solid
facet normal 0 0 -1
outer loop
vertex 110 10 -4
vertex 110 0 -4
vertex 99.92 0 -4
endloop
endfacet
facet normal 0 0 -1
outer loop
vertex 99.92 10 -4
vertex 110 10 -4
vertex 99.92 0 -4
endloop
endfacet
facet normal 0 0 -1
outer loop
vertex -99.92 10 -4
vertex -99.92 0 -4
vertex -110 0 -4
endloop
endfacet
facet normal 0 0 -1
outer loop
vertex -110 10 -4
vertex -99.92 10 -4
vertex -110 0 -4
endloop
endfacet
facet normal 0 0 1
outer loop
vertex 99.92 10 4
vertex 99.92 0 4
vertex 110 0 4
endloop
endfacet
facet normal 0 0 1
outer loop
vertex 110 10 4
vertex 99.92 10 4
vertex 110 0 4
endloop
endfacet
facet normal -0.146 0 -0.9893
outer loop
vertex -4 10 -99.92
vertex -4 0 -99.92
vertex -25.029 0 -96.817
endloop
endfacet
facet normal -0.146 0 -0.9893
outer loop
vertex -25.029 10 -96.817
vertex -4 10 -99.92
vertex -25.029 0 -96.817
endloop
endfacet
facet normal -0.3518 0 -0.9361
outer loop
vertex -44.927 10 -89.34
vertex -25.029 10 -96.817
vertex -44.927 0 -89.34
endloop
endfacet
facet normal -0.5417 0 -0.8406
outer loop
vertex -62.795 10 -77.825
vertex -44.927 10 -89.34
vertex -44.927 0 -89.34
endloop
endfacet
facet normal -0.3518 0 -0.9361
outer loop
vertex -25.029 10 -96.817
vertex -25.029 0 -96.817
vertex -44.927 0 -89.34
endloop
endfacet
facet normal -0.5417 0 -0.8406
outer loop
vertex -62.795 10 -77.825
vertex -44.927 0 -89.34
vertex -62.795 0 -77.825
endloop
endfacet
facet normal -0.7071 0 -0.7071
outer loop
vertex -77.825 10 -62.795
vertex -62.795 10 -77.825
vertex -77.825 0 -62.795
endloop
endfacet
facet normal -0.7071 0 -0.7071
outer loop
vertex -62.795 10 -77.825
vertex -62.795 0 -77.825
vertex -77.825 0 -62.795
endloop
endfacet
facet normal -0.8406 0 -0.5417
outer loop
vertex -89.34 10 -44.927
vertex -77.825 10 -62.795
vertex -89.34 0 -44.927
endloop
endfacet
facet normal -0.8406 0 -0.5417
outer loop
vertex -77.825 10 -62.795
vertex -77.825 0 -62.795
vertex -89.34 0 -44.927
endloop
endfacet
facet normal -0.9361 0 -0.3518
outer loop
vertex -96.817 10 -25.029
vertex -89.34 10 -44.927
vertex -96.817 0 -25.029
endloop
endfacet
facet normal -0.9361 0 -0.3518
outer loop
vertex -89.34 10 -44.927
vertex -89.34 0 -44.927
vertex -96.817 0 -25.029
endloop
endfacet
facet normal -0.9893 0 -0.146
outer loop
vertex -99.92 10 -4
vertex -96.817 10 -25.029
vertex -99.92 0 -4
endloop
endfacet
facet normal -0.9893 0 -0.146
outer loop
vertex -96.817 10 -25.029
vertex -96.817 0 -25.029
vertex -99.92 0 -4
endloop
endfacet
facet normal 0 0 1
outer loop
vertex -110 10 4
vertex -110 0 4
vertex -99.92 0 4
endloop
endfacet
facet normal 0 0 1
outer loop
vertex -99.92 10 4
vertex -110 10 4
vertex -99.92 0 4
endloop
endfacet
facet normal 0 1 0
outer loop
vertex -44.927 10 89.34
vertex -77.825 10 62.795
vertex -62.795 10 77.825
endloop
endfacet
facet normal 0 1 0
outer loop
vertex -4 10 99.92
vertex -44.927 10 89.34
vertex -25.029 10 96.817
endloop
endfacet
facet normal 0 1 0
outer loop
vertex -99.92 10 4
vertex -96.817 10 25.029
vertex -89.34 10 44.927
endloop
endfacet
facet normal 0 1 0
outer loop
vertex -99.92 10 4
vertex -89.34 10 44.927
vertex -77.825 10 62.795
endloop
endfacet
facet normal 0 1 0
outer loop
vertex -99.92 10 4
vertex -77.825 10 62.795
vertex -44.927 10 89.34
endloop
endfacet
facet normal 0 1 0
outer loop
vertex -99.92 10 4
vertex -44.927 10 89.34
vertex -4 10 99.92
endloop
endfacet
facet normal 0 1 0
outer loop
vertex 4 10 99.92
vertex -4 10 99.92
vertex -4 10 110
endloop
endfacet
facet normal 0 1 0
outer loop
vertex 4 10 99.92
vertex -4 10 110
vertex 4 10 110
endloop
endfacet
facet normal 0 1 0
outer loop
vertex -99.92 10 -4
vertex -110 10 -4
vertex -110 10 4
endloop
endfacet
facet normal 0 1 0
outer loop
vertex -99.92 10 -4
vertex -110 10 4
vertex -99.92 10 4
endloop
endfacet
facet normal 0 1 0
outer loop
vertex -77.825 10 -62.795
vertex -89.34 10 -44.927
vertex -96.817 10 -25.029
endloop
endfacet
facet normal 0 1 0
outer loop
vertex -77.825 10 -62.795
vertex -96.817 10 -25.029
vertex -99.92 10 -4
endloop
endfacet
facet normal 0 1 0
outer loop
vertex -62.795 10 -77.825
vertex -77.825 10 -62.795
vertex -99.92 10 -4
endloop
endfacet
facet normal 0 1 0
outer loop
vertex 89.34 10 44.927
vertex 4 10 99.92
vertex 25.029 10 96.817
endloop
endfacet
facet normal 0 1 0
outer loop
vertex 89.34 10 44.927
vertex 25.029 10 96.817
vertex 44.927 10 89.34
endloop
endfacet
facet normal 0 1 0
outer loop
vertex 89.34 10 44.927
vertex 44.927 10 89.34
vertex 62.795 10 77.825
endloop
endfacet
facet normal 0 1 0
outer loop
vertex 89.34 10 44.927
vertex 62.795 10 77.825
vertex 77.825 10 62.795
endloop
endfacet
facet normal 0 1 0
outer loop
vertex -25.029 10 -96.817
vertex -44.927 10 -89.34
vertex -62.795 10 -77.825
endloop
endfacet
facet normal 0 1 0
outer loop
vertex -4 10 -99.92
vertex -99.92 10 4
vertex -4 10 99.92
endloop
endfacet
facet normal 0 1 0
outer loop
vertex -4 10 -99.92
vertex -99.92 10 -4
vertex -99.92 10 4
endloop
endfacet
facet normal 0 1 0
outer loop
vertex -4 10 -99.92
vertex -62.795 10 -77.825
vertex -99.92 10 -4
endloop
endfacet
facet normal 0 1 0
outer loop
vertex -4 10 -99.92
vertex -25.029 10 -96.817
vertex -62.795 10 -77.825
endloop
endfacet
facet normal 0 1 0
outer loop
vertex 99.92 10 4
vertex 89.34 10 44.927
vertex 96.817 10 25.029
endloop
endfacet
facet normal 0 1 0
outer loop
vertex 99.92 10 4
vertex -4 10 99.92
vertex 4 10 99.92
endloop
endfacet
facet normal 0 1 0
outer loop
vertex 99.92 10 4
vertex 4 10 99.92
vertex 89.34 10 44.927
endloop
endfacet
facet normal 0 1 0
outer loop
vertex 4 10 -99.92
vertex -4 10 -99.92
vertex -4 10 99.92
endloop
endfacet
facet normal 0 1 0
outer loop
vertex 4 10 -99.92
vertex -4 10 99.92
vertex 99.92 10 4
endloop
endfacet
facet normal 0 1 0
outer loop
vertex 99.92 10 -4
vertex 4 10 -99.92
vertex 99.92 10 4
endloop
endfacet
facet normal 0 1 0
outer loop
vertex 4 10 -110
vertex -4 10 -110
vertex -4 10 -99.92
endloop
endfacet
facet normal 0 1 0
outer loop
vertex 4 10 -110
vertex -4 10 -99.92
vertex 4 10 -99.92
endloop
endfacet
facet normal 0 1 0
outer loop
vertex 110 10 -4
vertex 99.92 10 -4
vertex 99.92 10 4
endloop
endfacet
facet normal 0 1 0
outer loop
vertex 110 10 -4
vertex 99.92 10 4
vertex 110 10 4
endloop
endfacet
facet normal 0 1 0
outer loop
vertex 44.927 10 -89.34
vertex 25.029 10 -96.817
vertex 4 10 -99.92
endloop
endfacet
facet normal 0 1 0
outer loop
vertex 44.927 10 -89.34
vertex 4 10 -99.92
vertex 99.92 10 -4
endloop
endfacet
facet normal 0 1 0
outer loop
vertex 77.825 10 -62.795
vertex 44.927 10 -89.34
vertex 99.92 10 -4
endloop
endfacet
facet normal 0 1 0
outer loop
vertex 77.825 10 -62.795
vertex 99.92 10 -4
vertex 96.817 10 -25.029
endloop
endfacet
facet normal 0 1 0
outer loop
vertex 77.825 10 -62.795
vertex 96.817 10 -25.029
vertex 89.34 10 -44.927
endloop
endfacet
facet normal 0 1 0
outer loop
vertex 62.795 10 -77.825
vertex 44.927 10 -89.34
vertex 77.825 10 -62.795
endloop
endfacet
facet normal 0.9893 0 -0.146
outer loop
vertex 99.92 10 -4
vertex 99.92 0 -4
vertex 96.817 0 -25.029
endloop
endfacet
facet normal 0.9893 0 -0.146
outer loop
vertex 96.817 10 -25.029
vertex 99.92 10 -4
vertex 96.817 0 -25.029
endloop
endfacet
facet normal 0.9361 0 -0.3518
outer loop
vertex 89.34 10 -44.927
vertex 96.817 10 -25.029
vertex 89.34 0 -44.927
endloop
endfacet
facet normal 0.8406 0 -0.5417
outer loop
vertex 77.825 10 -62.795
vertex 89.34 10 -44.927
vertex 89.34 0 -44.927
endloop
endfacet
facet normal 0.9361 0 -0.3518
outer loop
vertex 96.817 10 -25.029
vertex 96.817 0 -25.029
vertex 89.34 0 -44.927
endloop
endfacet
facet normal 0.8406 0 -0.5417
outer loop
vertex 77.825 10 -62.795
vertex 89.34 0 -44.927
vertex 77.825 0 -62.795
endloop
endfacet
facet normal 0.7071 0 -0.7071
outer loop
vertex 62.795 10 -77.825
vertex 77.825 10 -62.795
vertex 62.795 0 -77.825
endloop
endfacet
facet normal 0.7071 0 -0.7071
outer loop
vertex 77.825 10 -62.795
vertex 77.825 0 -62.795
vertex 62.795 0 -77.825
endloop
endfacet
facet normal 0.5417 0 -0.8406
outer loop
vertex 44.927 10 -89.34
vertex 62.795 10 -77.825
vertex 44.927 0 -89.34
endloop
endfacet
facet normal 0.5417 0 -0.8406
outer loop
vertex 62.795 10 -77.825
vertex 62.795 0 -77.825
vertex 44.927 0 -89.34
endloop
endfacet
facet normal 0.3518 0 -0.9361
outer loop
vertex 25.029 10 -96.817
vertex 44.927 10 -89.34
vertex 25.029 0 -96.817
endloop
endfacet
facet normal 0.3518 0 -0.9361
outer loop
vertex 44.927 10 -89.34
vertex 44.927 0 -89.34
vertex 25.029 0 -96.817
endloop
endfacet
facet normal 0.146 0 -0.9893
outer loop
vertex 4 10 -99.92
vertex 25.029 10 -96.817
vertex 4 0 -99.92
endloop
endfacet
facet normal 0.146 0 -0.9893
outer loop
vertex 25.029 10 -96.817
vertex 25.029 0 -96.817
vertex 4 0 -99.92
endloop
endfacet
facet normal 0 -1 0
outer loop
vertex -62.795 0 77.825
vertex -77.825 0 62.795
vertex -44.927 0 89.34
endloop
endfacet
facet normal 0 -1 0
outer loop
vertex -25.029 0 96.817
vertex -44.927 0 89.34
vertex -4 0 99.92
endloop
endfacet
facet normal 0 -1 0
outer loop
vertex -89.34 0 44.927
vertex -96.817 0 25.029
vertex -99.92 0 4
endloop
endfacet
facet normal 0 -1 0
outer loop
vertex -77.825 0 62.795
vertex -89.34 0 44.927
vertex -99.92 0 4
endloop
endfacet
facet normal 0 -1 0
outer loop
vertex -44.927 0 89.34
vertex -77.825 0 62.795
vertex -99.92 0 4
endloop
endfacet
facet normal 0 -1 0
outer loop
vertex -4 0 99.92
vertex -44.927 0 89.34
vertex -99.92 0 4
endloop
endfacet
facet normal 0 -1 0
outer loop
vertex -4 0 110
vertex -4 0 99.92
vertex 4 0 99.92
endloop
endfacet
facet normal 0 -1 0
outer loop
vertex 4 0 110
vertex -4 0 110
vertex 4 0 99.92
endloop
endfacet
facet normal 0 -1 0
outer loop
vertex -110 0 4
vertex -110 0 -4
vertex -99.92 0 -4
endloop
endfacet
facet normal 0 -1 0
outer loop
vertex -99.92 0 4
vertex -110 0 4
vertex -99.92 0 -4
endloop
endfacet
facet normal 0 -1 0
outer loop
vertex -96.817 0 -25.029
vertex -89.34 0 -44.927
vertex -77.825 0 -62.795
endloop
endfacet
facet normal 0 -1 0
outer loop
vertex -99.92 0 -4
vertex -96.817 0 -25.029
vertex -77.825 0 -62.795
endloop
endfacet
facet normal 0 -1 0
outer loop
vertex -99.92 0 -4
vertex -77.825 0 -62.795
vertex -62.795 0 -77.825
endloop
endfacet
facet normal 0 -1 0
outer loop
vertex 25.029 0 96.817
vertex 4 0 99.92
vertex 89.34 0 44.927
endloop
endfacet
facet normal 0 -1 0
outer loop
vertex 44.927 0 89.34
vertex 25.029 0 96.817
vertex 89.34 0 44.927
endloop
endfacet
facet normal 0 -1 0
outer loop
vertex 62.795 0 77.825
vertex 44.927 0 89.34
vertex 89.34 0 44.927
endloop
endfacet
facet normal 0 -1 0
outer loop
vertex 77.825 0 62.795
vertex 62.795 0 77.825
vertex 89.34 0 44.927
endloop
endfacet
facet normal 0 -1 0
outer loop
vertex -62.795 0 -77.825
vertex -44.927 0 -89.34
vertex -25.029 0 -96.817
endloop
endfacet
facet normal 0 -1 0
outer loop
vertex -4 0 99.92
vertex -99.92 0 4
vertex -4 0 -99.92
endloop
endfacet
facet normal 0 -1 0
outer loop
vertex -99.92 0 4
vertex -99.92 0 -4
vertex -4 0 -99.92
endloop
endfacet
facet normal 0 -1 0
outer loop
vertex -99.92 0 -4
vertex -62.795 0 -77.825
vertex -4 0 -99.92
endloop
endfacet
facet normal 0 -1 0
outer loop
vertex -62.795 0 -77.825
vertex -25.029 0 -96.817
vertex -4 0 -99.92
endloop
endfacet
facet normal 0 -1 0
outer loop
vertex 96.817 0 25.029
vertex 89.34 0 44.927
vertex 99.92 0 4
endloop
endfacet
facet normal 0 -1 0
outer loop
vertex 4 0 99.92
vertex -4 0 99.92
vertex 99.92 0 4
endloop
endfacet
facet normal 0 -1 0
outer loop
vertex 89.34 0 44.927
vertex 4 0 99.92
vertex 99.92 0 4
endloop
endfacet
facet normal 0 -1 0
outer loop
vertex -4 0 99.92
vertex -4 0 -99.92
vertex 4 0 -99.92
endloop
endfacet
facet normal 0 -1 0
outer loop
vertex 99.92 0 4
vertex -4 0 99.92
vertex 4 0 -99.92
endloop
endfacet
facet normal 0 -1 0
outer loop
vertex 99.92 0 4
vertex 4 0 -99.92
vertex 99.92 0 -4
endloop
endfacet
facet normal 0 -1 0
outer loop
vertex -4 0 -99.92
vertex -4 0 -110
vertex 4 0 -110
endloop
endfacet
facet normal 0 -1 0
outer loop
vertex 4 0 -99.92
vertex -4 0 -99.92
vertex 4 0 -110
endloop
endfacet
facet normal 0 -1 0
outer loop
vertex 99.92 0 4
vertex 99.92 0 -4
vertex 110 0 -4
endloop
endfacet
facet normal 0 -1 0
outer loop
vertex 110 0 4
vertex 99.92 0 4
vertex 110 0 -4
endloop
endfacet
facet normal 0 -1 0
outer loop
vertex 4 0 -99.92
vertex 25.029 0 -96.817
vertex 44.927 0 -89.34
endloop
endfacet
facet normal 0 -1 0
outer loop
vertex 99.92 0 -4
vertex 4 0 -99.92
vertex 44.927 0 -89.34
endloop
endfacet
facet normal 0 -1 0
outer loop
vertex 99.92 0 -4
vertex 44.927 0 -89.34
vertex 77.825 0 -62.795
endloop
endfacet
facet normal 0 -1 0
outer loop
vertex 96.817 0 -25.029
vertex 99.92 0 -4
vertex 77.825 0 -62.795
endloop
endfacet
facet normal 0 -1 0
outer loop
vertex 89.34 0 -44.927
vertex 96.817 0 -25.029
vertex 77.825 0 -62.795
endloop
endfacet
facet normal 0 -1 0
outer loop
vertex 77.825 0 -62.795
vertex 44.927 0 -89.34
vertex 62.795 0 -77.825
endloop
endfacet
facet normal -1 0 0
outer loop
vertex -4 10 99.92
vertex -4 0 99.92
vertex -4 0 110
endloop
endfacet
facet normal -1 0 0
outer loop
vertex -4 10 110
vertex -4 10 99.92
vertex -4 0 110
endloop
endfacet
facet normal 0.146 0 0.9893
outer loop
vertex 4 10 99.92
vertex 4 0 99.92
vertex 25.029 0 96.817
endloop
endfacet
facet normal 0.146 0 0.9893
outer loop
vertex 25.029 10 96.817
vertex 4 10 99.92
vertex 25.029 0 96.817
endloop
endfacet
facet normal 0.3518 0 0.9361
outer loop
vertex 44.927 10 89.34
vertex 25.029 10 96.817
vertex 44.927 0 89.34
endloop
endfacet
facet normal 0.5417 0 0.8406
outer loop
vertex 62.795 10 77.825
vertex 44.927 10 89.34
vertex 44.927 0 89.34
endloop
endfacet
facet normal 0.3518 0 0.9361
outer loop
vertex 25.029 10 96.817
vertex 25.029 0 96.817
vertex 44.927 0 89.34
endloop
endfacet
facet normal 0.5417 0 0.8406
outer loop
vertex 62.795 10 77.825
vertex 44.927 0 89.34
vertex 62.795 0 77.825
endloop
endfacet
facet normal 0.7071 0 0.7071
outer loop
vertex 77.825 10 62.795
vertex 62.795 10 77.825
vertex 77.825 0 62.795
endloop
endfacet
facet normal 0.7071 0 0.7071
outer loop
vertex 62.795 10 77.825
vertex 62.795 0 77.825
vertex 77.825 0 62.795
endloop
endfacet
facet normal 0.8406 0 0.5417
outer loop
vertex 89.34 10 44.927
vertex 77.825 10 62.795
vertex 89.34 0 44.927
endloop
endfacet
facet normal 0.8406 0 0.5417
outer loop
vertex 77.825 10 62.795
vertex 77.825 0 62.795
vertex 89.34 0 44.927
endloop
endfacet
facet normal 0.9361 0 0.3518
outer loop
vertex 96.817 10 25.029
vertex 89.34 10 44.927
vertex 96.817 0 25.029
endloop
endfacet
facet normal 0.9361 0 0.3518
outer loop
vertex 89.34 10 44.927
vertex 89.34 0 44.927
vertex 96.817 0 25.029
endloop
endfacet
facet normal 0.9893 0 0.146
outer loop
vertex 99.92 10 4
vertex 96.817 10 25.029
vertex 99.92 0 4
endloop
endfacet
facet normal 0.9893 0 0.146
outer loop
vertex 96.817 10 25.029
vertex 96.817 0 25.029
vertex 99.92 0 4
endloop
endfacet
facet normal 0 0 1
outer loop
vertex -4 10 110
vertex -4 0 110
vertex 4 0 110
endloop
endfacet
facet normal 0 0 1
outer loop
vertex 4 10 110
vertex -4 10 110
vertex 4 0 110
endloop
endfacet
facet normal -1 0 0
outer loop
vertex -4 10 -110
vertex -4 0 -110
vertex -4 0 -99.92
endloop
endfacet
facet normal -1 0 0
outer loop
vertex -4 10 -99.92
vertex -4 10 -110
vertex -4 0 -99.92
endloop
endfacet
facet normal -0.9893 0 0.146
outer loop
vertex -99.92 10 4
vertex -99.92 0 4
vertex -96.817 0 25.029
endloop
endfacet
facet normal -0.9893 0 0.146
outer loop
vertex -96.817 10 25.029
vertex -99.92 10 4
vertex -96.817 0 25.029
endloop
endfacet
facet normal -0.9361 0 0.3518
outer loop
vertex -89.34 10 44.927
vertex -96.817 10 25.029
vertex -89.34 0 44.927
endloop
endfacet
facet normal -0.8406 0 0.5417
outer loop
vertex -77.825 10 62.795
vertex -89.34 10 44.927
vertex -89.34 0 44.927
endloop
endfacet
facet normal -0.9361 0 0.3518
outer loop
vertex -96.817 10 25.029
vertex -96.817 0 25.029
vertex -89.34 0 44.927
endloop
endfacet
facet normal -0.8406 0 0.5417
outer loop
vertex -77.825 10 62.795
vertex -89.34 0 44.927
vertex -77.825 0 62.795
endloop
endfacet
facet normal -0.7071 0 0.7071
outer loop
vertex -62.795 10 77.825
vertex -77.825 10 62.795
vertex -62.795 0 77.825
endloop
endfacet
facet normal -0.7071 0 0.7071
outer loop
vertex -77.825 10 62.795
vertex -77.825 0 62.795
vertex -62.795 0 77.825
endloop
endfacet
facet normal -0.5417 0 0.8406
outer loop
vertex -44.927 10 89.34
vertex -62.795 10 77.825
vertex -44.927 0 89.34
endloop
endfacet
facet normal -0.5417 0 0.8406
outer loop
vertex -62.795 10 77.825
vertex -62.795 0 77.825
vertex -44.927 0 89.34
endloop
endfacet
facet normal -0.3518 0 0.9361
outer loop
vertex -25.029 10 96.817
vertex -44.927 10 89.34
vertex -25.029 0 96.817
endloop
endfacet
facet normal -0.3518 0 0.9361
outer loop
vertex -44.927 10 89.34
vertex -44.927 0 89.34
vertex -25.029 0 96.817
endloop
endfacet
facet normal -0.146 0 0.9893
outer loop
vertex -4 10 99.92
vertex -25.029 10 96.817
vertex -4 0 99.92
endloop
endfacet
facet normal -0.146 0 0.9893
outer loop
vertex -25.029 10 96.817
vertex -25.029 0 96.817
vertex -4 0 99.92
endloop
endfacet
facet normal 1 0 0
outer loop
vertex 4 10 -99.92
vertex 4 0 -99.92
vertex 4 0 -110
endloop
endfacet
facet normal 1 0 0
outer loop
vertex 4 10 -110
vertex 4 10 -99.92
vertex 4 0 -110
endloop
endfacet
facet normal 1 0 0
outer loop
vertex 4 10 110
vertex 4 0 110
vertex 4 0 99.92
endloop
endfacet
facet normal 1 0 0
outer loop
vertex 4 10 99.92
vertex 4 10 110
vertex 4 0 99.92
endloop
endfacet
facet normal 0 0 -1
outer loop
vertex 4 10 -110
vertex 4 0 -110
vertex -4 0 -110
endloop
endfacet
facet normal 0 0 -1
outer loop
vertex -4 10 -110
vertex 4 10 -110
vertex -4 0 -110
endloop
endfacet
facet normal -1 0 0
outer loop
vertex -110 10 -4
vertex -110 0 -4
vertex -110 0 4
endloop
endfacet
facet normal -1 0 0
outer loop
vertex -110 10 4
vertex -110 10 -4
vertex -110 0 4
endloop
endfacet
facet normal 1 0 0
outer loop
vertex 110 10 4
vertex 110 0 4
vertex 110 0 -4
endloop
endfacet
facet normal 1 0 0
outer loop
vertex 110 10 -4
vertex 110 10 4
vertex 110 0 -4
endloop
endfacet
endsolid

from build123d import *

# Parameters (mm, degrees)
EXTRUDE_2_DEPTH = 10


with BuildPart() as part:
    # 草图3 → 凸台-拉伸2 (new body)
    with BuildSketch(Plane(origin=(0, 0, 0), x_dir=(1, 0, 0), z_dir=(0, 1, 0))):
        with BuildLine():
            Line((0, 110), (-4, 110))
            Line((-4, 110), (-4, 99.919967974))
            ThreePointArc((-4, 99.919967974), (-70.710678119, 70.710678119), (-99.919967974, 4))
            Line((-99.919967974, 4), (-110, 4))
            Line((-110, 4), (-110, 0))
            Line((-110, 0), (-110, -4))
            Line((-110, -4), (-99.919967974, -4))
            ThreePointArc((-99.919967974, -4), (-70.710678119, -70.710678119), (-4, -99.919967974))
            Line((-4, -99.919967974), (-4, -110))
            Line((-4, -110), (0, -110))
            Line((0, -110), (4, -110))
            Line((4, -110), (4, -99.919967974))
            ThreePointArc((4, -99.919967974), (70.710678119, -70.710678119), (99.919967974, -4))
            Line((99.919967974, -4), (110, -4))
            Line((110, -4), (110, 0))
            Line((110, 0), (110, 4))
            Line((110, 4), (99.919967974, 4))
            ThreePointArc((99.919967974, 4), (70.710678119, 70.710678119), (4, 99.919967974))
            Line((4, 99.919967974), (4, 110))
            Line((4, 110), (0, 110))
        make_face()
    extrude(amount=EXTRUDE_2_DEPTH)


solid = part.part
